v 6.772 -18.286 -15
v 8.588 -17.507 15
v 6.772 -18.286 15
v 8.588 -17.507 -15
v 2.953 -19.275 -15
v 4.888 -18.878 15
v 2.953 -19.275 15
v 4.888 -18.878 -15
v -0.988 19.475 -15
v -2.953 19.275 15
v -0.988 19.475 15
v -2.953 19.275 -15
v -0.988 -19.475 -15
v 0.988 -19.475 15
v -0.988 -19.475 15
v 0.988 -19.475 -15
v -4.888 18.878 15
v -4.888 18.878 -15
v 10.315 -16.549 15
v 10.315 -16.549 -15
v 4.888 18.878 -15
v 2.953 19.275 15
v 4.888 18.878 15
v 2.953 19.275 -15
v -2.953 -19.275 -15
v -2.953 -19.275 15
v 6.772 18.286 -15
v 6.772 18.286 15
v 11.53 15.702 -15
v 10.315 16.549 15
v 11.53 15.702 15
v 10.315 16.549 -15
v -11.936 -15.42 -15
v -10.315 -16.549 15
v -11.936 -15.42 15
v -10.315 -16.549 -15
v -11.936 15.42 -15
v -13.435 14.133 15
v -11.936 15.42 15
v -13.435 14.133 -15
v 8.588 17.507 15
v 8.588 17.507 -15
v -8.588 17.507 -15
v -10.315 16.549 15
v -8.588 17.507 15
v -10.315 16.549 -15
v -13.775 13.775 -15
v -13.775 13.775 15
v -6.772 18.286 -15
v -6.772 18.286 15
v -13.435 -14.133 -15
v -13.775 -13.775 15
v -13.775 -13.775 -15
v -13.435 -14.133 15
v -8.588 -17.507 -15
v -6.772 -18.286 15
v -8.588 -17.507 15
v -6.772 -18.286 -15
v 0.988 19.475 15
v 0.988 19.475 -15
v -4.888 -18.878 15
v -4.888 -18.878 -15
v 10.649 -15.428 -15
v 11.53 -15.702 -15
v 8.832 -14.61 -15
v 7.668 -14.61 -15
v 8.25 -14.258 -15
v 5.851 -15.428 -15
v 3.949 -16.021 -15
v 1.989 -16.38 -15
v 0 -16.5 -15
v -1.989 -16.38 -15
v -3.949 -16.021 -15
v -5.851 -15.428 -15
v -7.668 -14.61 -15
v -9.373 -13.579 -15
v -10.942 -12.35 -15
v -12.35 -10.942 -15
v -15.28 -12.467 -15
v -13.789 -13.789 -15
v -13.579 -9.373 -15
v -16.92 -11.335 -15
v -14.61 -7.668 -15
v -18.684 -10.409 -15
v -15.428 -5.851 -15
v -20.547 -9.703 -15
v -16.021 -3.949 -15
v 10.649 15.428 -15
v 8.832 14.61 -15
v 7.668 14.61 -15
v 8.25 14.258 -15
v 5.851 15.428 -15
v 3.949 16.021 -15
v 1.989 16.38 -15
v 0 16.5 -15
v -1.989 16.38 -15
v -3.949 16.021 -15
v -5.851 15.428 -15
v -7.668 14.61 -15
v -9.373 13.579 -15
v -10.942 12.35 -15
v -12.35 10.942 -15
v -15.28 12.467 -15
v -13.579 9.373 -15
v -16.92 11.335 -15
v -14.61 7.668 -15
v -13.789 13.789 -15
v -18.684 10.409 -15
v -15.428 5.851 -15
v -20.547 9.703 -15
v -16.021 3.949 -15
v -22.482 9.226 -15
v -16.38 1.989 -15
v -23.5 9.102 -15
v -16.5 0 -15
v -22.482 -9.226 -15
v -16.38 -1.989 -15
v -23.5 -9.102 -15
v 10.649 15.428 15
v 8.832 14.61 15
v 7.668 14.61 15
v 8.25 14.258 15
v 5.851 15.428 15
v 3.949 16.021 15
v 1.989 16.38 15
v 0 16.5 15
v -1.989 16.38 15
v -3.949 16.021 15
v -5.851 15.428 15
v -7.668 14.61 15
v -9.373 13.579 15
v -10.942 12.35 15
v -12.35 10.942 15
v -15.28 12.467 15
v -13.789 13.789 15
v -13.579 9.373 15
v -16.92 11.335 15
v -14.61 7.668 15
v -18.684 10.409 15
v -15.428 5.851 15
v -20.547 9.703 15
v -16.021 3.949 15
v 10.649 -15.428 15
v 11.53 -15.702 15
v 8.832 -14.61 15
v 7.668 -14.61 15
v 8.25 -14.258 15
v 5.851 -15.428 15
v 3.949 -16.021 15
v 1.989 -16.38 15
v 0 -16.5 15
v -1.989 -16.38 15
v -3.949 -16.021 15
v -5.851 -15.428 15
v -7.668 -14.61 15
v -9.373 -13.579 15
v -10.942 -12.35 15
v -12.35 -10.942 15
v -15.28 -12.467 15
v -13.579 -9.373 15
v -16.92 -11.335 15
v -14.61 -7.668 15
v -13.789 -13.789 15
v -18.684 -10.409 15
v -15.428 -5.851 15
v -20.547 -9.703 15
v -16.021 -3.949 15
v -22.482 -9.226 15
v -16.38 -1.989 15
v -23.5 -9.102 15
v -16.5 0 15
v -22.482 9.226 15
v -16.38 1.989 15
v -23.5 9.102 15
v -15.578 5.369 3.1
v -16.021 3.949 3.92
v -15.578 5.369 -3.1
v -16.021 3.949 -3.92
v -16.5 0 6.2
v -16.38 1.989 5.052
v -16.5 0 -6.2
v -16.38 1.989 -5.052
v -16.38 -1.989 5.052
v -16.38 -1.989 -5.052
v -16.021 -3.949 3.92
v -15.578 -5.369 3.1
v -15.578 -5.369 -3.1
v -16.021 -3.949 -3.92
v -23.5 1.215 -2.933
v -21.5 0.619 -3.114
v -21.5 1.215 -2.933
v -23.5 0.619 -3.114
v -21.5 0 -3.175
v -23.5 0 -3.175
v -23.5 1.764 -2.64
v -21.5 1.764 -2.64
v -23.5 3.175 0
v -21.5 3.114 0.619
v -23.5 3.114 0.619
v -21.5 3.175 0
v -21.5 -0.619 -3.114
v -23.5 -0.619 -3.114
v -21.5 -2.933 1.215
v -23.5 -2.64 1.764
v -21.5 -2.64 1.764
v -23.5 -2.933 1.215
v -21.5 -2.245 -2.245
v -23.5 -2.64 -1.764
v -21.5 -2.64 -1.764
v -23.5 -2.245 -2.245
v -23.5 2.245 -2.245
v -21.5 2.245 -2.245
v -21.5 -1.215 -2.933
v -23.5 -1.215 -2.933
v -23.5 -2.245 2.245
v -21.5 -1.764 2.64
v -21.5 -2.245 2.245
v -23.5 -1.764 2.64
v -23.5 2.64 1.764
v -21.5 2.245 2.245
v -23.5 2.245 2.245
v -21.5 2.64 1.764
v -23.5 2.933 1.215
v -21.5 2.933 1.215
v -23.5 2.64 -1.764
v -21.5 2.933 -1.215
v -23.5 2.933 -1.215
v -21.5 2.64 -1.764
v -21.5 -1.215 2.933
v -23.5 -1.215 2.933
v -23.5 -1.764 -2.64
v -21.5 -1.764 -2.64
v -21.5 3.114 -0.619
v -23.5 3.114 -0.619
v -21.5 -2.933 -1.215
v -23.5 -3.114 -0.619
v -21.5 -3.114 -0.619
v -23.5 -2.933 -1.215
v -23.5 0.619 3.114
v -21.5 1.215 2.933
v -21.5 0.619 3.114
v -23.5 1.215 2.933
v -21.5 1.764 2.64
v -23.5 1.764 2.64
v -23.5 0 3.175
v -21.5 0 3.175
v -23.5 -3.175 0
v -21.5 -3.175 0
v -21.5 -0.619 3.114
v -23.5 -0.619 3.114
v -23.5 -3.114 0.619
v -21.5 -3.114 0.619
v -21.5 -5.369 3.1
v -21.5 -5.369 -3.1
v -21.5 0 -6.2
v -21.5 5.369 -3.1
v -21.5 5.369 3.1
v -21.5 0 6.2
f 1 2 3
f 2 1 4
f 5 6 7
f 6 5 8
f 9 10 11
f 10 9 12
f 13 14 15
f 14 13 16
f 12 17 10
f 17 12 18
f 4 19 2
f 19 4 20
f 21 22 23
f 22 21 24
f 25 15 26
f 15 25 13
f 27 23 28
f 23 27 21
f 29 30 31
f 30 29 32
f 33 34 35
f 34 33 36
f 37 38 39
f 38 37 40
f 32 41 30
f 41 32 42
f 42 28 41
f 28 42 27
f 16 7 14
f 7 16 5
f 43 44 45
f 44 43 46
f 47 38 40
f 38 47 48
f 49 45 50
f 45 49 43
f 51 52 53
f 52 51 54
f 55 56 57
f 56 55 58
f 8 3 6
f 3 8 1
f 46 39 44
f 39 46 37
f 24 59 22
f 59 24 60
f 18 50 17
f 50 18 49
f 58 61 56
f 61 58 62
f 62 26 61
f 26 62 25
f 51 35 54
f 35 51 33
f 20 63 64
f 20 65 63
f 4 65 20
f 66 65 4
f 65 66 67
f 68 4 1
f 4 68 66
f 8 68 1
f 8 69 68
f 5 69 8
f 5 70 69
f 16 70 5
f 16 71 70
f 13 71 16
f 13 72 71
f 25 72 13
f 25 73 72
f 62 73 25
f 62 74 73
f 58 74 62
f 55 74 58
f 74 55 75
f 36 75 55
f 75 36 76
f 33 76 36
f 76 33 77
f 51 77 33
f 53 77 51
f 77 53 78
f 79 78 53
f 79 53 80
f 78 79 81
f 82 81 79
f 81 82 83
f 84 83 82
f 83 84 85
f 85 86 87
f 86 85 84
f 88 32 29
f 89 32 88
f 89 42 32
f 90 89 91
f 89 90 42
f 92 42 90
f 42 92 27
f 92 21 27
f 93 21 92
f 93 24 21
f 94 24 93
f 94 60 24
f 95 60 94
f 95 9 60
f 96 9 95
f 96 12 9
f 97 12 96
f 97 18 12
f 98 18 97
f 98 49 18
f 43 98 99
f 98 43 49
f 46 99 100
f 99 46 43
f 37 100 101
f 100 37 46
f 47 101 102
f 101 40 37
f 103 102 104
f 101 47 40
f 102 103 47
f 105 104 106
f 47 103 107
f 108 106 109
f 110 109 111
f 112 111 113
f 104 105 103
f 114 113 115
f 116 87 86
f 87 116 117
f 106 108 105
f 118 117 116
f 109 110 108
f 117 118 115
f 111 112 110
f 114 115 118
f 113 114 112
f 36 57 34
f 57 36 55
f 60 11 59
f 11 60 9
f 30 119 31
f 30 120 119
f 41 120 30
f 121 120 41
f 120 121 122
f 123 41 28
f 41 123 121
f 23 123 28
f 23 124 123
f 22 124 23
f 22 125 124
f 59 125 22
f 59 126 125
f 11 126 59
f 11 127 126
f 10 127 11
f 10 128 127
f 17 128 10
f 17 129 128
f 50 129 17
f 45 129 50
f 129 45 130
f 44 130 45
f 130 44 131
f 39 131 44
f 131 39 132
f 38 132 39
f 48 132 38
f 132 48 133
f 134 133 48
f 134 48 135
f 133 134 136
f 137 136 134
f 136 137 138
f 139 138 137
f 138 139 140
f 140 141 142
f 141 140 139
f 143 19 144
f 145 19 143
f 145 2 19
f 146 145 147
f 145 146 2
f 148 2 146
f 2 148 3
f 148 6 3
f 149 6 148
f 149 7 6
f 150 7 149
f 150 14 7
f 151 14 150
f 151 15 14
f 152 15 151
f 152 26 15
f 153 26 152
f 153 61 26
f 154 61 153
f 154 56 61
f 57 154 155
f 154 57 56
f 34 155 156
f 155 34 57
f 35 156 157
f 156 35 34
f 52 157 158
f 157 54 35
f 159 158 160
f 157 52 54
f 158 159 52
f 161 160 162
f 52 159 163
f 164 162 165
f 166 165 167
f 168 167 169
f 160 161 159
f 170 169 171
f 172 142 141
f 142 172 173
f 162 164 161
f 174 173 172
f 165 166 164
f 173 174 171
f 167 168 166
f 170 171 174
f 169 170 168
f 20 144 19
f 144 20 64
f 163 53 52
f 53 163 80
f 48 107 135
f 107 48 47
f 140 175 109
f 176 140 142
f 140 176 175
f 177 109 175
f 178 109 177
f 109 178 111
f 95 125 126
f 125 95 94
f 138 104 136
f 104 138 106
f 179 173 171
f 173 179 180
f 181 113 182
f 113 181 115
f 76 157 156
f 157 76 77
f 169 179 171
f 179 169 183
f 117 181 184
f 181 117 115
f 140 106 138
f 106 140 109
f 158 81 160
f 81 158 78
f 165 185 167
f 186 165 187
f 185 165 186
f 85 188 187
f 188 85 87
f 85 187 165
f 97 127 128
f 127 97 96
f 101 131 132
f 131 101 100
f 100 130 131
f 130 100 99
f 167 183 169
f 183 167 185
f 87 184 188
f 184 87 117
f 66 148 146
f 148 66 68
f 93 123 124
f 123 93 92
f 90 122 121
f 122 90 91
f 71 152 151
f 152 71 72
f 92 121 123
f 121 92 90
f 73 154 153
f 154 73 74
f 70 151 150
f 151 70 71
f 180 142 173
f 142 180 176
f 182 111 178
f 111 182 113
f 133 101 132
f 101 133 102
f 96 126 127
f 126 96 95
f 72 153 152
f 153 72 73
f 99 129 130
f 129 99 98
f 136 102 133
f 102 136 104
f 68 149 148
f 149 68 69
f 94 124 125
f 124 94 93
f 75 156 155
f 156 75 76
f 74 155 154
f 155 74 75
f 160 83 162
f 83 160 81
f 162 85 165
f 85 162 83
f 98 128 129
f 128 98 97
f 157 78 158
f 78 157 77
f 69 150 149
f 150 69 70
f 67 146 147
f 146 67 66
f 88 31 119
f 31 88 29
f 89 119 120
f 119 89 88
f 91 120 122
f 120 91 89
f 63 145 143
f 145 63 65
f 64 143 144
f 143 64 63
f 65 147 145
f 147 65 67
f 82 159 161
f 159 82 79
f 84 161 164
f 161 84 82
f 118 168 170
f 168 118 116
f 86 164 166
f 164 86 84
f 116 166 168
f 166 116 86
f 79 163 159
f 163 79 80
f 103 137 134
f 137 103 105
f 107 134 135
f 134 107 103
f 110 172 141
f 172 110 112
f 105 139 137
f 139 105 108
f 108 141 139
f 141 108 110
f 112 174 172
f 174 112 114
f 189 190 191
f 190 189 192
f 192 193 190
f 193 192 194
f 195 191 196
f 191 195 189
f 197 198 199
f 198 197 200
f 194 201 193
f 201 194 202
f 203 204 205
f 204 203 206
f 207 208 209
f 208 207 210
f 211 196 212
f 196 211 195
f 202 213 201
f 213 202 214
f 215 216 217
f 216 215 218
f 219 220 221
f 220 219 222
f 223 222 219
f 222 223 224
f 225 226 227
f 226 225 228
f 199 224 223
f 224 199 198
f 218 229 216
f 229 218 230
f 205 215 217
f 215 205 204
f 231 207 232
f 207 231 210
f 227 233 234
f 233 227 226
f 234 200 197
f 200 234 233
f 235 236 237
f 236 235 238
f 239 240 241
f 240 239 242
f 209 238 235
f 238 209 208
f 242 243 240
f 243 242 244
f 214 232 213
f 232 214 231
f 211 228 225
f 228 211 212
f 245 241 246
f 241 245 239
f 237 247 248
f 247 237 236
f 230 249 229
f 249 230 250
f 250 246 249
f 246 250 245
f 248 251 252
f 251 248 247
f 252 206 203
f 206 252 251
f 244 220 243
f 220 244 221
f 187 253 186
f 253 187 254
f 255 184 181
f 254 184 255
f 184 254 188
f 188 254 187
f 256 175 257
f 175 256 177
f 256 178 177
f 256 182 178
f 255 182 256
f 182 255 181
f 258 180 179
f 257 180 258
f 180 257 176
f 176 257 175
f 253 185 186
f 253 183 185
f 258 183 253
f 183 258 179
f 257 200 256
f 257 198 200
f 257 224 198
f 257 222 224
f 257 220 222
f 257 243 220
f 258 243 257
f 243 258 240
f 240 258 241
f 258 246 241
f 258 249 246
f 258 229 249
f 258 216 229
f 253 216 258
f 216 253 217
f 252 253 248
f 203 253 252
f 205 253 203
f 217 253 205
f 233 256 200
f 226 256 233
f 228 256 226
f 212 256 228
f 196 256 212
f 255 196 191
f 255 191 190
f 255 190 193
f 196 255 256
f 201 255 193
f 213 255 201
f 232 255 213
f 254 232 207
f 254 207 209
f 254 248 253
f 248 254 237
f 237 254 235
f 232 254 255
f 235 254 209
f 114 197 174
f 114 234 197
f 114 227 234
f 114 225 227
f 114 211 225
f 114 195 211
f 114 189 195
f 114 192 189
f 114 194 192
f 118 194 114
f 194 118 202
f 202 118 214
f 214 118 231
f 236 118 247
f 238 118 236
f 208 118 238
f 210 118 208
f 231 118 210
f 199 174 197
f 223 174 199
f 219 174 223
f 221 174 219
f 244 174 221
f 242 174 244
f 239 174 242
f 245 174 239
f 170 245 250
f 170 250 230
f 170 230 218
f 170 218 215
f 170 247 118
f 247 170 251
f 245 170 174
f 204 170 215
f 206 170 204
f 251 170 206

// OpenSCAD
barrel_diameter=33;
depth=30;

rotate([0,90,0]) intersection(){
	cube([depth+1,barrel_diameter+6,barrel_diameter+14],center=true);
	difference(){
		union(){
			rotate([0,90,0]) cylinder(d=barrel_diameter+6,h=depth,center=true,$fa=5);
			rotate([-135,0,0]) translate([0,barrel_diameter/2,barrel_diameter/2]) cube([depth,barrel_diameter,barrel_diameter],center=true);
		}
		union(){
			rotate([0,90,0]) cylinder(d=barrel_diameter,h=depth+1,center=true,$fa=5);
			translate([0,0,barrel_diameter/2]) rotate([0,90,0]) cylinder(d=barrel_diameter,h=depth+1,center=true,$fa=5);
			rotate([135,0,0]) translate([0,0,barrel_diameter+3]) rotate([0,90,0]) cylinder(d=barrel_diameter,h=depth+1,center=true,$fa=5);
			rotate([-135,0,0]) translate([0,0,barrel_diameter+3]) rotate([0,90,0]) cylinder(d=barrel_diameter,h=depth+1,center=true,$fa=5);
			translate([0,0,-barrel_diameter/2-3]) cylinder(h=10, d=6.35, center=true, $fn=32);
			translate([0,0,-barrel_diameter/2-5]) cylinder(h=10, d=12.4, $fa=60);
		}
	}
}
